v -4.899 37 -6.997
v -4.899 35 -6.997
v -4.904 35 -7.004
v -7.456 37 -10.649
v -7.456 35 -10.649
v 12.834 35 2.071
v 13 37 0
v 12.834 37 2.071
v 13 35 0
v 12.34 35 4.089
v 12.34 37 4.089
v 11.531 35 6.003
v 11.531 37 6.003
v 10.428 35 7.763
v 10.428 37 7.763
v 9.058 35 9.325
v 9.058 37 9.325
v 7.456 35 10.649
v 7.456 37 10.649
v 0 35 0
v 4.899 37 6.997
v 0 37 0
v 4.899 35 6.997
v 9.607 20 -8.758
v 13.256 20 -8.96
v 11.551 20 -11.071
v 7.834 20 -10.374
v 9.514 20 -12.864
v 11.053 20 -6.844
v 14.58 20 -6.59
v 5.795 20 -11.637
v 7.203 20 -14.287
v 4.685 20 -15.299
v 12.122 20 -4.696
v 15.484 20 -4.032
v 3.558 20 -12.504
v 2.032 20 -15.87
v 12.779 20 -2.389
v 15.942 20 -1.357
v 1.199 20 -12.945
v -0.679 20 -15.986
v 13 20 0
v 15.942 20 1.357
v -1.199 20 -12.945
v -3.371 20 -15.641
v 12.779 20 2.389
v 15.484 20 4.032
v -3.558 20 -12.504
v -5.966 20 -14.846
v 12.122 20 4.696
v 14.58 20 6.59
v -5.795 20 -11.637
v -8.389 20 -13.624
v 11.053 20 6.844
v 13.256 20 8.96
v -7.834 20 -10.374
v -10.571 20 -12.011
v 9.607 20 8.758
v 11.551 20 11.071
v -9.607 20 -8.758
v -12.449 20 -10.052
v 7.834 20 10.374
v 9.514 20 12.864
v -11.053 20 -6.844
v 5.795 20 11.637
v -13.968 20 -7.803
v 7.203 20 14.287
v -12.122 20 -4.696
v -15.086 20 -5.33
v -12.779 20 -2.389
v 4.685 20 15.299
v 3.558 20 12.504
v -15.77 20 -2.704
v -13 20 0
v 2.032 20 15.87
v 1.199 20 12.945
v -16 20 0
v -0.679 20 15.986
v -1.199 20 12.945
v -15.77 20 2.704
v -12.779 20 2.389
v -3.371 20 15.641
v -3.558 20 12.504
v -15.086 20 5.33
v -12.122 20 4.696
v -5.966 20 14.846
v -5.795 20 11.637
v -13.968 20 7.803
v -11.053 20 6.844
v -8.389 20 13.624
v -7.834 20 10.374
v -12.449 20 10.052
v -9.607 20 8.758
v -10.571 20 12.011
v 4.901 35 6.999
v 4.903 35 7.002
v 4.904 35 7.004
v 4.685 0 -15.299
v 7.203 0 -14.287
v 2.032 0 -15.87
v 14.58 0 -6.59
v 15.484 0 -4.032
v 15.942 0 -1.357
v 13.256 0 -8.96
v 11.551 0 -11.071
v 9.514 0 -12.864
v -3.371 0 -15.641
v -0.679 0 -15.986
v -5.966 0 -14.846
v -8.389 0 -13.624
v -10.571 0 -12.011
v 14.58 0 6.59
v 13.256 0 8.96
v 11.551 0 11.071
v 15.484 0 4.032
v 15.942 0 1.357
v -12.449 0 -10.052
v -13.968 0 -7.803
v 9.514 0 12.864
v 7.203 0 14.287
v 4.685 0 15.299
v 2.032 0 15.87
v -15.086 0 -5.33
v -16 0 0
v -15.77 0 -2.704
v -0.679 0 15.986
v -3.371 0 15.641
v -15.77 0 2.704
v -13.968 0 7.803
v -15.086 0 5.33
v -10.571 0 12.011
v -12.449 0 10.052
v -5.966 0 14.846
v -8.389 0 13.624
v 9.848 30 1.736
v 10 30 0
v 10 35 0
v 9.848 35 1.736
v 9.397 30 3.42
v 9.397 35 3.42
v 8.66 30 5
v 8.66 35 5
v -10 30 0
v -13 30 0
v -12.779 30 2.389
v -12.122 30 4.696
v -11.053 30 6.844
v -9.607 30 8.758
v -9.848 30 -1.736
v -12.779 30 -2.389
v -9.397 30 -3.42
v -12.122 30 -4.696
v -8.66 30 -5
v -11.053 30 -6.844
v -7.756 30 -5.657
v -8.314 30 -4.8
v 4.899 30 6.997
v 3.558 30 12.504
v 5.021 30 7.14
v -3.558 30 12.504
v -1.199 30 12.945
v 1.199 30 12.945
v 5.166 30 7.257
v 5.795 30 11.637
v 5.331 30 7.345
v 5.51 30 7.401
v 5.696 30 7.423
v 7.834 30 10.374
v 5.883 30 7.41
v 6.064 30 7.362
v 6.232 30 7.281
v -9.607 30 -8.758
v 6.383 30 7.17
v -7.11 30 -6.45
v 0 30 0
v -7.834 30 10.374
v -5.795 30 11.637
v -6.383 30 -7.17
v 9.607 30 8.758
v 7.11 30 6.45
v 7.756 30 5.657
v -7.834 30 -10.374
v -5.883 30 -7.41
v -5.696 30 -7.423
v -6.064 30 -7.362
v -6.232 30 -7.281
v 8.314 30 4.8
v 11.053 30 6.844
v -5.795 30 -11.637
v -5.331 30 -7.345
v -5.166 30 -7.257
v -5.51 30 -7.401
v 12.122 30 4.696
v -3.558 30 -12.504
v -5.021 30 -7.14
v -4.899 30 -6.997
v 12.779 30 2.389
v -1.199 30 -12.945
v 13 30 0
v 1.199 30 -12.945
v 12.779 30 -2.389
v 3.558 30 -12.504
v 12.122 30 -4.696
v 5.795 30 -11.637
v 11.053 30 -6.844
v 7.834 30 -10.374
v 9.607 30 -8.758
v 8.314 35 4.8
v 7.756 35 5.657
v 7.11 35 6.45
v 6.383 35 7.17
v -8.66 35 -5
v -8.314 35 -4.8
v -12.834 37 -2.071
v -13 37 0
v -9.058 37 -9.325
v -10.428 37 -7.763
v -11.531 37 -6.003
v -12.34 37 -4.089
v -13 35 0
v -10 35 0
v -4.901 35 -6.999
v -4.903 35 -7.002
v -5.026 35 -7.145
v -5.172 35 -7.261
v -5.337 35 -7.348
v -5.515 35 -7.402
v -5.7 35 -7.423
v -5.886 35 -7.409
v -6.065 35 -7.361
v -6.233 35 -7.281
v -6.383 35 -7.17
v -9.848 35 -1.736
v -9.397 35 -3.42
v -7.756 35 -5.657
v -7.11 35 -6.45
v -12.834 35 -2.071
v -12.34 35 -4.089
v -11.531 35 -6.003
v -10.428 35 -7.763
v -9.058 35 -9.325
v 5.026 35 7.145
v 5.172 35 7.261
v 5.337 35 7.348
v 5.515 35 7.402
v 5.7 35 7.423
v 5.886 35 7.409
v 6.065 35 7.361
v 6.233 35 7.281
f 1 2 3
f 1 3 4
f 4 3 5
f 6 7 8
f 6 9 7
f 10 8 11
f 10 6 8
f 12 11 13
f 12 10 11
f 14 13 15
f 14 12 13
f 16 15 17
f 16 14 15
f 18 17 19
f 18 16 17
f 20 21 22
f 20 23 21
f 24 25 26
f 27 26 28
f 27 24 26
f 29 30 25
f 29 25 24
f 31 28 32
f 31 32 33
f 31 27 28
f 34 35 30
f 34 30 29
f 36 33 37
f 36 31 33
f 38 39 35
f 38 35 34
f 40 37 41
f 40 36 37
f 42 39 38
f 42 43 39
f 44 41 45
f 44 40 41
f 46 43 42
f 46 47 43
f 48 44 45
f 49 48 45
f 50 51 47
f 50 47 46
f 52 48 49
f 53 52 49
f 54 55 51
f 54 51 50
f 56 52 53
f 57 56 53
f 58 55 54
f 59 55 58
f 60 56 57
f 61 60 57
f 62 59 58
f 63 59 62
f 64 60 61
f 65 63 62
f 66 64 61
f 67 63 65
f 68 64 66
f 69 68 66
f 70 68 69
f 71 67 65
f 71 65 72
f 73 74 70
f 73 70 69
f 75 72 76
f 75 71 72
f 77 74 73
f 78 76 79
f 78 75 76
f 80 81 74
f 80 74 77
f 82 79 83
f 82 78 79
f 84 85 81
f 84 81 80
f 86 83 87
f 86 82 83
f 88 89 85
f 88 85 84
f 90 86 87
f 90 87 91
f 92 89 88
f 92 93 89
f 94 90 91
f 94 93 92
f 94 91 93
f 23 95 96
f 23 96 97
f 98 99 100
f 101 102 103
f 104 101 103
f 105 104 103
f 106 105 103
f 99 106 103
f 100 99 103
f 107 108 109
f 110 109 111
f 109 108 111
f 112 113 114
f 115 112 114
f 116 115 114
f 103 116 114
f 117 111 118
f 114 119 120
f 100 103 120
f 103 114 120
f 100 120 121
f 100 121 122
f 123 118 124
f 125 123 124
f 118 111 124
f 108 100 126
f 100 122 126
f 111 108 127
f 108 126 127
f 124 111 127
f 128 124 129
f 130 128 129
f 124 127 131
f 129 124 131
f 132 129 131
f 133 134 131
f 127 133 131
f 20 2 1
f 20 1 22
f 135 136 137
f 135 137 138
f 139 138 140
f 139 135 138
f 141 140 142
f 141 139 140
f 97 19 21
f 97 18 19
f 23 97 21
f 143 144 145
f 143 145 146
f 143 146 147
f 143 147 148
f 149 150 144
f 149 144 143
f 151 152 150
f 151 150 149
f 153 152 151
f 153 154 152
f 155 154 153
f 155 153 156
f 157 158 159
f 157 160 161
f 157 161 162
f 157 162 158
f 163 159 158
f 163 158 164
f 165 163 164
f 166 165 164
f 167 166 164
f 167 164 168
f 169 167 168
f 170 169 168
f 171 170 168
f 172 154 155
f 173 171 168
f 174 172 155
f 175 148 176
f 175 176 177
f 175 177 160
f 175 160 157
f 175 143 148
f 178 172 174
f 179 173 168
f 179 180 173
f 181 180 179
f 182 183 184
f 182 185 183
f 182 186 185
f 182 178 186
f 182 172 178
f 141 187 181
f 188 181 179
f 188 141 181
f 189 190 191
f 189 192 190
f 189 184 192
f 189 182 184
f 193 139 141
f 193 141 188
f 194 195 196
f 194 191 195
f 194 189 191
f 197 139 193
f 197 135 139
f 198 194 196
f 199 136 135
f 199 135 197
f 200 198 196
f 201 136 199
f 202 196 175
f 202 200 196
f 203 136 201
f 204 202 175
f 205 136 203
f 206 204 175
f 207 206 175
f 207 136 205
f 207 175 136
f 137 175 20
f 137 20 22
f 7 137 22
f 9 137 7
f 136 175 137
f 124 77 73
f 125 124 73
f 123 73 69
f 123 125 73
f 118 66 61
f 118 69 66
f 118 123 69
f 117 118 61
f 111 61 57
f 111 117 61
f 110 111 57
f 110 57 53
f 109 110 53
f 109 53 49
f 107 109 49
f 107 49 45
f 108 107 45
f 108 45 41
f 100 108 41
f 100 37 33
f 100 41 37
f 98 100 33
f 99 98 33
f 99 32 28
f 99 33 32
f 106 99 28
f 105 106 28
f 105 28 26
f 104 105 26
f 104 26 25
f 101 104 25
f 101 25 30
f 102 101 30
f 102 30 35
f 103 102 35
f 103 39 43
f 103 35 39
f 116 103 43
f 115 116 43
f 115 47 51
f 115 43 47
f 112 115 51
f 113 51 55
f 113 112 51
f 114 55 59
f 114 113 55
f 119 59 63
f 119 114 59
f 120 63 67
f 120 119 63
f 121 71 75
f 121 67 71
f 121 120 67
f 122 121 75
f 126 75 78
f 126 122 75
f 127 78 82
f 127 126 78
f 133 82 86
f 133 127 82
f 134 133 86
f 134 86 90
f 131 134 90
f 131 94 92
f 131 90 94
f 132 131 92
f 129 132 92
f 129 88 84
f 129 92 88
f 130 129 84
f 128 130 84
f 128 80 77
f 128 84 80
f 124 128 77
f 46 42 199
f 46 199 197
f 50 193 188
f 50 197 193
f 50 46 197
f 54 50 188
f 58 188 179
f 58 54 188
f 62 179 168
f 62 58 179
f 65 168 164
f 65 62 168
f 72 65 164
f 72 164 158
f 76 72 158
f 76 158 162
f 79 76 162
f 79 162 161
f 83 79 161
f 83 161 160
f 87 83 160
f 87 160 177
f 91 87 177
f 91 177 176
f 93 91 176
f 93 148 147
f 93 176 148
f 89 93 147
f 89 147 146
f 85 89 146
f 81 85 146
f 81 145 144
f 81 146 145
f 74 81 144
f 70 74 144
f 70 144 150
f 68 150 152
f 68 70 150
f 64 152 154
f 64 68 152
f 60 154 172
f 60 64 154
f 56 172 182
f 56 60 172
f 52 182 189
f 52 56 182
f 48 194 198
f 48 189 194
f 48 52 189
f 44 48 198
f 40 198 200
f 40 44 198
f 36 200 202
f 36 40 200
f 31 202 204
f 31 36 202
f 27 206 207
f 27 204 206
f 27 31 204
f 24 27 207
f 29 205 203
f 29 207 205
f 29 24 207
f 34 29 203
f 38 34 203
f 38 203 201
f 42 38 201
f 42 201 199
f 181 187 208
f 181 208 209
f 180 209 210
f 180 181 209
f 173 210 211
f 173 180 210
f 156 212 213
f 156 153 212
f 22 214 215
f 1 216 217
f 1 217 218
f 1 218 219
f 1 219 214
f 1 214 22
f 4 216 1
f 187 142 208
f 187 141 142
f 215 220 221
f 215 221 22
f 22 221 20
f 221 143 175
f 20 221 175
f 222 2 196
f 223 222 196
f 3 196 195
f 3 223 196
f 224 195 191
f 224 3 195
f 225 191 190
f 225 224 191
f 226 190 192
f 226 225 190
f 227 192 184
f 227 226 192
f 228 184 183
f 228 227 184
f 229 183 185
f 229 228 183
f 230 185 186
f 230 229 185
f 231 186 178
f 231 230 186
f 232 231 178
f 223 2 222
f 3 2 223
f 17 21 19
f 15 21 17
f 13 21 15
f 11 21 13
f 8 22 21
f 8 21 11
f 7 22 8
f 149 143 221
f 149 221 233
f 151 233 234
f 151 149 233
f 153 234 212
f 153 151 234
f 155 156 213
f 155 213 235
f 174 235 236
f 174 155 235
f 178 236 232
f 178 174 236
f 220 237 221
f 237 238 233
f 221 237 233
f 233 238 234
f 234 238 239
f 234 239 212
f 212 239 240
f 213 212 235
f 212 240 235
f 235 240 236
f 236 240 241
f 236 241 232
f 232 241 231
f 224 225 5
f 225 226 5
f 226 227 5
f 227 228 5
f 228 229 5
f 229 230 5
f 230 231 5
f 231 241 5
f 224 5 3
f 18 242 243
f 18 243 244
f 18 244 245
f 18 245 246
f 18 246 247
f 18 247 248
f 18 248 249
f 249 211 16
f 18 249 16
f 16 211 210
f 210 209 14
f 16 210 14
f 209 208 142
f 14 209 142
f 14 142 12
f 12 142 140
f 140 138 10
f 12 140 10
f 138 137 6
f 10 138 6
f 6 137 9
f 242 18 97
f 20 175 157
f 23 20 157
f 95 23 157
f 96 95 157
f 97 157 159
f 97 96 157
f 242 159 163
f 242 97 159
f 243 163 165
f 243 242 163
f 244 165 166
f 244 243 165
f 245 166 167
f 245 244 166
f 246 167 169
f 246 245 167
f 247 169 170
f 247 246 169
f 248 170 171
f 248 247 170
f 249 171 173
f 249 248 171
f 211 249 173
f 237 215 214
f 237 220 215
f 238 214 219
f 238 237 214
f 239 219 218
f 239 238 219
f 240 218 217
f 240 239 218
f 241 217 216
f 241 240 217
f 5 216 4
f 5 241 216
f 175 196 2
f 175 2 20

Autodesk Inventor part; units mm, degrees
ref_plane "YZ Plane" through (0, 0, 0) normal (1, 0, 0) x (0, 1, 0)
ref_plane "XZ Plane" through (0, 0, 0) normal (0, 1, 0) x (-1, 0, 0)
ref_plane "XY Plane" through (0, 0, 0) normal (0, 0, 1) x (1, 0, 0)
sketch "スケッチ1" plane through (0, 0, 0) normal (0, 1, 0) x (-1, 0, 0)
  circle A0 centre (0, 0) radius 16
  dimension "d0" = 32
extrude "押し出し1" add sketch "スケッチ1" along normal blind 20
sketch "スケッチ2" plane through (0, 20, 0) normal (0, 1, 0) x (1, 0, 0)
  circle A0 centre (0, 0) radius 13
  dimension "d3" = 26
extrude "押し出し2" add sketch "スケッチ2" along normal blind 10
sketch "スケッチ3" plane through (0, 30, 0) normal (0, 1, 0) x (1, 0, 0)
  arc A0 (-8.6603, 5) -> (-10, 0) centre (0, 0) ccw
  line L0 (0, 0) -> (-8.6603, 5) construction
  line L1 (0, 0) -> (-10, 0) construction
  arc A1 (-5.5063, 7.8639) -> (-8.3138, 4.8) centre (0, 0) ccw
  line L2 (0, 0) -> (-5.5063, 7.8639) construction
  line L3 (0, 0) -> (-8.3138, 4.8) construction
  arc A2 (8.6603, -5) -> (10, 0) centre (0, 0) ccw
  line L4 (0, 0) -> (8.6603, -5) construction
  line L5 (0, 0) -> (10, 0) construction
  arc A3 (5.5063, -7.8639) -> (8.3138, -4.8) centre (0, 0) ccw
  line L6 (0, 0) -> (5.5063, -7.8639) construction
  line L7 (0, 0) -> (8.3138, -4.8) construction
  line L8 (-8.6603, 5) -> (-8.3138, 4.8)
  line L9 (8.6603, -5) -> (8.3138, -4.8)
  line L10 (-5.5063, 7.8639) -> (5.5063, -7.8639)
  line L11 (-10, 0) -> (10, 0)
  dimension "d6" = 10
  dimension "d7" = 30
  dimension "d10" = 9.6
  dimension "d11" = 25
  dimension "d12" = 10
  dimension "d13" = 30
  dimension "d14" = 9.6
  dimension "d15" = 25
extrude "押し出し3" add sketch "スケッチ3" along normal blind 5
fillet "フィレット1" radius 1 2 edges at (-5.5063, 32.5, -7.8639) (5.5063, 32.5, 7.8639)
sketch "スケッチ4" plane through (0, 35, 0) normal (0, 1, 0) x (1, 0, 0)
  line L0 (-4.8993, 6.9969) -> (0, 0) projected
  line L1 (4.8993, -6.9969) -> (0, 0) projected
  arc A0 (7.4565, -10.649) -> (13, 0) centre (0, 0) ccw
  line L2 (0, 0) -> (7.4565, -10.649) construction
  line L3 (0, 0) -> (13, 0) construction
  line L4 (0, 0) -> (10, 0) projected
  arc A1 (-7.4565, 10.649) -> (-13, 0) centre (0, 0) ccw
  line L5 (0, 0) -> (-7.4565, 10.649) construction
  line L6 (0, 0) -> (-13, 0) construction
  circle A2 centre (0, 0) radius 13 projected
  line L7 (7.4565, -10.649) -> (0, 0)
  line L8 (0, 0) -> (13, 0)
  line L9 (0, 0) -> (-13, 0)
  line L10 (0, 0) -> (-7.4565, 10.649)
  dimension "d21" = 13
  dimension "d22" = 55
  dimension "d23" = 13
  dimension "d24" = 55
extrude "押し出し4" add sketch "スケッチ4" along normal blind 2 contours L0 L9 A1 L10 | L4 L8 A0 L7 L1
properties part number "kumi4-1"
